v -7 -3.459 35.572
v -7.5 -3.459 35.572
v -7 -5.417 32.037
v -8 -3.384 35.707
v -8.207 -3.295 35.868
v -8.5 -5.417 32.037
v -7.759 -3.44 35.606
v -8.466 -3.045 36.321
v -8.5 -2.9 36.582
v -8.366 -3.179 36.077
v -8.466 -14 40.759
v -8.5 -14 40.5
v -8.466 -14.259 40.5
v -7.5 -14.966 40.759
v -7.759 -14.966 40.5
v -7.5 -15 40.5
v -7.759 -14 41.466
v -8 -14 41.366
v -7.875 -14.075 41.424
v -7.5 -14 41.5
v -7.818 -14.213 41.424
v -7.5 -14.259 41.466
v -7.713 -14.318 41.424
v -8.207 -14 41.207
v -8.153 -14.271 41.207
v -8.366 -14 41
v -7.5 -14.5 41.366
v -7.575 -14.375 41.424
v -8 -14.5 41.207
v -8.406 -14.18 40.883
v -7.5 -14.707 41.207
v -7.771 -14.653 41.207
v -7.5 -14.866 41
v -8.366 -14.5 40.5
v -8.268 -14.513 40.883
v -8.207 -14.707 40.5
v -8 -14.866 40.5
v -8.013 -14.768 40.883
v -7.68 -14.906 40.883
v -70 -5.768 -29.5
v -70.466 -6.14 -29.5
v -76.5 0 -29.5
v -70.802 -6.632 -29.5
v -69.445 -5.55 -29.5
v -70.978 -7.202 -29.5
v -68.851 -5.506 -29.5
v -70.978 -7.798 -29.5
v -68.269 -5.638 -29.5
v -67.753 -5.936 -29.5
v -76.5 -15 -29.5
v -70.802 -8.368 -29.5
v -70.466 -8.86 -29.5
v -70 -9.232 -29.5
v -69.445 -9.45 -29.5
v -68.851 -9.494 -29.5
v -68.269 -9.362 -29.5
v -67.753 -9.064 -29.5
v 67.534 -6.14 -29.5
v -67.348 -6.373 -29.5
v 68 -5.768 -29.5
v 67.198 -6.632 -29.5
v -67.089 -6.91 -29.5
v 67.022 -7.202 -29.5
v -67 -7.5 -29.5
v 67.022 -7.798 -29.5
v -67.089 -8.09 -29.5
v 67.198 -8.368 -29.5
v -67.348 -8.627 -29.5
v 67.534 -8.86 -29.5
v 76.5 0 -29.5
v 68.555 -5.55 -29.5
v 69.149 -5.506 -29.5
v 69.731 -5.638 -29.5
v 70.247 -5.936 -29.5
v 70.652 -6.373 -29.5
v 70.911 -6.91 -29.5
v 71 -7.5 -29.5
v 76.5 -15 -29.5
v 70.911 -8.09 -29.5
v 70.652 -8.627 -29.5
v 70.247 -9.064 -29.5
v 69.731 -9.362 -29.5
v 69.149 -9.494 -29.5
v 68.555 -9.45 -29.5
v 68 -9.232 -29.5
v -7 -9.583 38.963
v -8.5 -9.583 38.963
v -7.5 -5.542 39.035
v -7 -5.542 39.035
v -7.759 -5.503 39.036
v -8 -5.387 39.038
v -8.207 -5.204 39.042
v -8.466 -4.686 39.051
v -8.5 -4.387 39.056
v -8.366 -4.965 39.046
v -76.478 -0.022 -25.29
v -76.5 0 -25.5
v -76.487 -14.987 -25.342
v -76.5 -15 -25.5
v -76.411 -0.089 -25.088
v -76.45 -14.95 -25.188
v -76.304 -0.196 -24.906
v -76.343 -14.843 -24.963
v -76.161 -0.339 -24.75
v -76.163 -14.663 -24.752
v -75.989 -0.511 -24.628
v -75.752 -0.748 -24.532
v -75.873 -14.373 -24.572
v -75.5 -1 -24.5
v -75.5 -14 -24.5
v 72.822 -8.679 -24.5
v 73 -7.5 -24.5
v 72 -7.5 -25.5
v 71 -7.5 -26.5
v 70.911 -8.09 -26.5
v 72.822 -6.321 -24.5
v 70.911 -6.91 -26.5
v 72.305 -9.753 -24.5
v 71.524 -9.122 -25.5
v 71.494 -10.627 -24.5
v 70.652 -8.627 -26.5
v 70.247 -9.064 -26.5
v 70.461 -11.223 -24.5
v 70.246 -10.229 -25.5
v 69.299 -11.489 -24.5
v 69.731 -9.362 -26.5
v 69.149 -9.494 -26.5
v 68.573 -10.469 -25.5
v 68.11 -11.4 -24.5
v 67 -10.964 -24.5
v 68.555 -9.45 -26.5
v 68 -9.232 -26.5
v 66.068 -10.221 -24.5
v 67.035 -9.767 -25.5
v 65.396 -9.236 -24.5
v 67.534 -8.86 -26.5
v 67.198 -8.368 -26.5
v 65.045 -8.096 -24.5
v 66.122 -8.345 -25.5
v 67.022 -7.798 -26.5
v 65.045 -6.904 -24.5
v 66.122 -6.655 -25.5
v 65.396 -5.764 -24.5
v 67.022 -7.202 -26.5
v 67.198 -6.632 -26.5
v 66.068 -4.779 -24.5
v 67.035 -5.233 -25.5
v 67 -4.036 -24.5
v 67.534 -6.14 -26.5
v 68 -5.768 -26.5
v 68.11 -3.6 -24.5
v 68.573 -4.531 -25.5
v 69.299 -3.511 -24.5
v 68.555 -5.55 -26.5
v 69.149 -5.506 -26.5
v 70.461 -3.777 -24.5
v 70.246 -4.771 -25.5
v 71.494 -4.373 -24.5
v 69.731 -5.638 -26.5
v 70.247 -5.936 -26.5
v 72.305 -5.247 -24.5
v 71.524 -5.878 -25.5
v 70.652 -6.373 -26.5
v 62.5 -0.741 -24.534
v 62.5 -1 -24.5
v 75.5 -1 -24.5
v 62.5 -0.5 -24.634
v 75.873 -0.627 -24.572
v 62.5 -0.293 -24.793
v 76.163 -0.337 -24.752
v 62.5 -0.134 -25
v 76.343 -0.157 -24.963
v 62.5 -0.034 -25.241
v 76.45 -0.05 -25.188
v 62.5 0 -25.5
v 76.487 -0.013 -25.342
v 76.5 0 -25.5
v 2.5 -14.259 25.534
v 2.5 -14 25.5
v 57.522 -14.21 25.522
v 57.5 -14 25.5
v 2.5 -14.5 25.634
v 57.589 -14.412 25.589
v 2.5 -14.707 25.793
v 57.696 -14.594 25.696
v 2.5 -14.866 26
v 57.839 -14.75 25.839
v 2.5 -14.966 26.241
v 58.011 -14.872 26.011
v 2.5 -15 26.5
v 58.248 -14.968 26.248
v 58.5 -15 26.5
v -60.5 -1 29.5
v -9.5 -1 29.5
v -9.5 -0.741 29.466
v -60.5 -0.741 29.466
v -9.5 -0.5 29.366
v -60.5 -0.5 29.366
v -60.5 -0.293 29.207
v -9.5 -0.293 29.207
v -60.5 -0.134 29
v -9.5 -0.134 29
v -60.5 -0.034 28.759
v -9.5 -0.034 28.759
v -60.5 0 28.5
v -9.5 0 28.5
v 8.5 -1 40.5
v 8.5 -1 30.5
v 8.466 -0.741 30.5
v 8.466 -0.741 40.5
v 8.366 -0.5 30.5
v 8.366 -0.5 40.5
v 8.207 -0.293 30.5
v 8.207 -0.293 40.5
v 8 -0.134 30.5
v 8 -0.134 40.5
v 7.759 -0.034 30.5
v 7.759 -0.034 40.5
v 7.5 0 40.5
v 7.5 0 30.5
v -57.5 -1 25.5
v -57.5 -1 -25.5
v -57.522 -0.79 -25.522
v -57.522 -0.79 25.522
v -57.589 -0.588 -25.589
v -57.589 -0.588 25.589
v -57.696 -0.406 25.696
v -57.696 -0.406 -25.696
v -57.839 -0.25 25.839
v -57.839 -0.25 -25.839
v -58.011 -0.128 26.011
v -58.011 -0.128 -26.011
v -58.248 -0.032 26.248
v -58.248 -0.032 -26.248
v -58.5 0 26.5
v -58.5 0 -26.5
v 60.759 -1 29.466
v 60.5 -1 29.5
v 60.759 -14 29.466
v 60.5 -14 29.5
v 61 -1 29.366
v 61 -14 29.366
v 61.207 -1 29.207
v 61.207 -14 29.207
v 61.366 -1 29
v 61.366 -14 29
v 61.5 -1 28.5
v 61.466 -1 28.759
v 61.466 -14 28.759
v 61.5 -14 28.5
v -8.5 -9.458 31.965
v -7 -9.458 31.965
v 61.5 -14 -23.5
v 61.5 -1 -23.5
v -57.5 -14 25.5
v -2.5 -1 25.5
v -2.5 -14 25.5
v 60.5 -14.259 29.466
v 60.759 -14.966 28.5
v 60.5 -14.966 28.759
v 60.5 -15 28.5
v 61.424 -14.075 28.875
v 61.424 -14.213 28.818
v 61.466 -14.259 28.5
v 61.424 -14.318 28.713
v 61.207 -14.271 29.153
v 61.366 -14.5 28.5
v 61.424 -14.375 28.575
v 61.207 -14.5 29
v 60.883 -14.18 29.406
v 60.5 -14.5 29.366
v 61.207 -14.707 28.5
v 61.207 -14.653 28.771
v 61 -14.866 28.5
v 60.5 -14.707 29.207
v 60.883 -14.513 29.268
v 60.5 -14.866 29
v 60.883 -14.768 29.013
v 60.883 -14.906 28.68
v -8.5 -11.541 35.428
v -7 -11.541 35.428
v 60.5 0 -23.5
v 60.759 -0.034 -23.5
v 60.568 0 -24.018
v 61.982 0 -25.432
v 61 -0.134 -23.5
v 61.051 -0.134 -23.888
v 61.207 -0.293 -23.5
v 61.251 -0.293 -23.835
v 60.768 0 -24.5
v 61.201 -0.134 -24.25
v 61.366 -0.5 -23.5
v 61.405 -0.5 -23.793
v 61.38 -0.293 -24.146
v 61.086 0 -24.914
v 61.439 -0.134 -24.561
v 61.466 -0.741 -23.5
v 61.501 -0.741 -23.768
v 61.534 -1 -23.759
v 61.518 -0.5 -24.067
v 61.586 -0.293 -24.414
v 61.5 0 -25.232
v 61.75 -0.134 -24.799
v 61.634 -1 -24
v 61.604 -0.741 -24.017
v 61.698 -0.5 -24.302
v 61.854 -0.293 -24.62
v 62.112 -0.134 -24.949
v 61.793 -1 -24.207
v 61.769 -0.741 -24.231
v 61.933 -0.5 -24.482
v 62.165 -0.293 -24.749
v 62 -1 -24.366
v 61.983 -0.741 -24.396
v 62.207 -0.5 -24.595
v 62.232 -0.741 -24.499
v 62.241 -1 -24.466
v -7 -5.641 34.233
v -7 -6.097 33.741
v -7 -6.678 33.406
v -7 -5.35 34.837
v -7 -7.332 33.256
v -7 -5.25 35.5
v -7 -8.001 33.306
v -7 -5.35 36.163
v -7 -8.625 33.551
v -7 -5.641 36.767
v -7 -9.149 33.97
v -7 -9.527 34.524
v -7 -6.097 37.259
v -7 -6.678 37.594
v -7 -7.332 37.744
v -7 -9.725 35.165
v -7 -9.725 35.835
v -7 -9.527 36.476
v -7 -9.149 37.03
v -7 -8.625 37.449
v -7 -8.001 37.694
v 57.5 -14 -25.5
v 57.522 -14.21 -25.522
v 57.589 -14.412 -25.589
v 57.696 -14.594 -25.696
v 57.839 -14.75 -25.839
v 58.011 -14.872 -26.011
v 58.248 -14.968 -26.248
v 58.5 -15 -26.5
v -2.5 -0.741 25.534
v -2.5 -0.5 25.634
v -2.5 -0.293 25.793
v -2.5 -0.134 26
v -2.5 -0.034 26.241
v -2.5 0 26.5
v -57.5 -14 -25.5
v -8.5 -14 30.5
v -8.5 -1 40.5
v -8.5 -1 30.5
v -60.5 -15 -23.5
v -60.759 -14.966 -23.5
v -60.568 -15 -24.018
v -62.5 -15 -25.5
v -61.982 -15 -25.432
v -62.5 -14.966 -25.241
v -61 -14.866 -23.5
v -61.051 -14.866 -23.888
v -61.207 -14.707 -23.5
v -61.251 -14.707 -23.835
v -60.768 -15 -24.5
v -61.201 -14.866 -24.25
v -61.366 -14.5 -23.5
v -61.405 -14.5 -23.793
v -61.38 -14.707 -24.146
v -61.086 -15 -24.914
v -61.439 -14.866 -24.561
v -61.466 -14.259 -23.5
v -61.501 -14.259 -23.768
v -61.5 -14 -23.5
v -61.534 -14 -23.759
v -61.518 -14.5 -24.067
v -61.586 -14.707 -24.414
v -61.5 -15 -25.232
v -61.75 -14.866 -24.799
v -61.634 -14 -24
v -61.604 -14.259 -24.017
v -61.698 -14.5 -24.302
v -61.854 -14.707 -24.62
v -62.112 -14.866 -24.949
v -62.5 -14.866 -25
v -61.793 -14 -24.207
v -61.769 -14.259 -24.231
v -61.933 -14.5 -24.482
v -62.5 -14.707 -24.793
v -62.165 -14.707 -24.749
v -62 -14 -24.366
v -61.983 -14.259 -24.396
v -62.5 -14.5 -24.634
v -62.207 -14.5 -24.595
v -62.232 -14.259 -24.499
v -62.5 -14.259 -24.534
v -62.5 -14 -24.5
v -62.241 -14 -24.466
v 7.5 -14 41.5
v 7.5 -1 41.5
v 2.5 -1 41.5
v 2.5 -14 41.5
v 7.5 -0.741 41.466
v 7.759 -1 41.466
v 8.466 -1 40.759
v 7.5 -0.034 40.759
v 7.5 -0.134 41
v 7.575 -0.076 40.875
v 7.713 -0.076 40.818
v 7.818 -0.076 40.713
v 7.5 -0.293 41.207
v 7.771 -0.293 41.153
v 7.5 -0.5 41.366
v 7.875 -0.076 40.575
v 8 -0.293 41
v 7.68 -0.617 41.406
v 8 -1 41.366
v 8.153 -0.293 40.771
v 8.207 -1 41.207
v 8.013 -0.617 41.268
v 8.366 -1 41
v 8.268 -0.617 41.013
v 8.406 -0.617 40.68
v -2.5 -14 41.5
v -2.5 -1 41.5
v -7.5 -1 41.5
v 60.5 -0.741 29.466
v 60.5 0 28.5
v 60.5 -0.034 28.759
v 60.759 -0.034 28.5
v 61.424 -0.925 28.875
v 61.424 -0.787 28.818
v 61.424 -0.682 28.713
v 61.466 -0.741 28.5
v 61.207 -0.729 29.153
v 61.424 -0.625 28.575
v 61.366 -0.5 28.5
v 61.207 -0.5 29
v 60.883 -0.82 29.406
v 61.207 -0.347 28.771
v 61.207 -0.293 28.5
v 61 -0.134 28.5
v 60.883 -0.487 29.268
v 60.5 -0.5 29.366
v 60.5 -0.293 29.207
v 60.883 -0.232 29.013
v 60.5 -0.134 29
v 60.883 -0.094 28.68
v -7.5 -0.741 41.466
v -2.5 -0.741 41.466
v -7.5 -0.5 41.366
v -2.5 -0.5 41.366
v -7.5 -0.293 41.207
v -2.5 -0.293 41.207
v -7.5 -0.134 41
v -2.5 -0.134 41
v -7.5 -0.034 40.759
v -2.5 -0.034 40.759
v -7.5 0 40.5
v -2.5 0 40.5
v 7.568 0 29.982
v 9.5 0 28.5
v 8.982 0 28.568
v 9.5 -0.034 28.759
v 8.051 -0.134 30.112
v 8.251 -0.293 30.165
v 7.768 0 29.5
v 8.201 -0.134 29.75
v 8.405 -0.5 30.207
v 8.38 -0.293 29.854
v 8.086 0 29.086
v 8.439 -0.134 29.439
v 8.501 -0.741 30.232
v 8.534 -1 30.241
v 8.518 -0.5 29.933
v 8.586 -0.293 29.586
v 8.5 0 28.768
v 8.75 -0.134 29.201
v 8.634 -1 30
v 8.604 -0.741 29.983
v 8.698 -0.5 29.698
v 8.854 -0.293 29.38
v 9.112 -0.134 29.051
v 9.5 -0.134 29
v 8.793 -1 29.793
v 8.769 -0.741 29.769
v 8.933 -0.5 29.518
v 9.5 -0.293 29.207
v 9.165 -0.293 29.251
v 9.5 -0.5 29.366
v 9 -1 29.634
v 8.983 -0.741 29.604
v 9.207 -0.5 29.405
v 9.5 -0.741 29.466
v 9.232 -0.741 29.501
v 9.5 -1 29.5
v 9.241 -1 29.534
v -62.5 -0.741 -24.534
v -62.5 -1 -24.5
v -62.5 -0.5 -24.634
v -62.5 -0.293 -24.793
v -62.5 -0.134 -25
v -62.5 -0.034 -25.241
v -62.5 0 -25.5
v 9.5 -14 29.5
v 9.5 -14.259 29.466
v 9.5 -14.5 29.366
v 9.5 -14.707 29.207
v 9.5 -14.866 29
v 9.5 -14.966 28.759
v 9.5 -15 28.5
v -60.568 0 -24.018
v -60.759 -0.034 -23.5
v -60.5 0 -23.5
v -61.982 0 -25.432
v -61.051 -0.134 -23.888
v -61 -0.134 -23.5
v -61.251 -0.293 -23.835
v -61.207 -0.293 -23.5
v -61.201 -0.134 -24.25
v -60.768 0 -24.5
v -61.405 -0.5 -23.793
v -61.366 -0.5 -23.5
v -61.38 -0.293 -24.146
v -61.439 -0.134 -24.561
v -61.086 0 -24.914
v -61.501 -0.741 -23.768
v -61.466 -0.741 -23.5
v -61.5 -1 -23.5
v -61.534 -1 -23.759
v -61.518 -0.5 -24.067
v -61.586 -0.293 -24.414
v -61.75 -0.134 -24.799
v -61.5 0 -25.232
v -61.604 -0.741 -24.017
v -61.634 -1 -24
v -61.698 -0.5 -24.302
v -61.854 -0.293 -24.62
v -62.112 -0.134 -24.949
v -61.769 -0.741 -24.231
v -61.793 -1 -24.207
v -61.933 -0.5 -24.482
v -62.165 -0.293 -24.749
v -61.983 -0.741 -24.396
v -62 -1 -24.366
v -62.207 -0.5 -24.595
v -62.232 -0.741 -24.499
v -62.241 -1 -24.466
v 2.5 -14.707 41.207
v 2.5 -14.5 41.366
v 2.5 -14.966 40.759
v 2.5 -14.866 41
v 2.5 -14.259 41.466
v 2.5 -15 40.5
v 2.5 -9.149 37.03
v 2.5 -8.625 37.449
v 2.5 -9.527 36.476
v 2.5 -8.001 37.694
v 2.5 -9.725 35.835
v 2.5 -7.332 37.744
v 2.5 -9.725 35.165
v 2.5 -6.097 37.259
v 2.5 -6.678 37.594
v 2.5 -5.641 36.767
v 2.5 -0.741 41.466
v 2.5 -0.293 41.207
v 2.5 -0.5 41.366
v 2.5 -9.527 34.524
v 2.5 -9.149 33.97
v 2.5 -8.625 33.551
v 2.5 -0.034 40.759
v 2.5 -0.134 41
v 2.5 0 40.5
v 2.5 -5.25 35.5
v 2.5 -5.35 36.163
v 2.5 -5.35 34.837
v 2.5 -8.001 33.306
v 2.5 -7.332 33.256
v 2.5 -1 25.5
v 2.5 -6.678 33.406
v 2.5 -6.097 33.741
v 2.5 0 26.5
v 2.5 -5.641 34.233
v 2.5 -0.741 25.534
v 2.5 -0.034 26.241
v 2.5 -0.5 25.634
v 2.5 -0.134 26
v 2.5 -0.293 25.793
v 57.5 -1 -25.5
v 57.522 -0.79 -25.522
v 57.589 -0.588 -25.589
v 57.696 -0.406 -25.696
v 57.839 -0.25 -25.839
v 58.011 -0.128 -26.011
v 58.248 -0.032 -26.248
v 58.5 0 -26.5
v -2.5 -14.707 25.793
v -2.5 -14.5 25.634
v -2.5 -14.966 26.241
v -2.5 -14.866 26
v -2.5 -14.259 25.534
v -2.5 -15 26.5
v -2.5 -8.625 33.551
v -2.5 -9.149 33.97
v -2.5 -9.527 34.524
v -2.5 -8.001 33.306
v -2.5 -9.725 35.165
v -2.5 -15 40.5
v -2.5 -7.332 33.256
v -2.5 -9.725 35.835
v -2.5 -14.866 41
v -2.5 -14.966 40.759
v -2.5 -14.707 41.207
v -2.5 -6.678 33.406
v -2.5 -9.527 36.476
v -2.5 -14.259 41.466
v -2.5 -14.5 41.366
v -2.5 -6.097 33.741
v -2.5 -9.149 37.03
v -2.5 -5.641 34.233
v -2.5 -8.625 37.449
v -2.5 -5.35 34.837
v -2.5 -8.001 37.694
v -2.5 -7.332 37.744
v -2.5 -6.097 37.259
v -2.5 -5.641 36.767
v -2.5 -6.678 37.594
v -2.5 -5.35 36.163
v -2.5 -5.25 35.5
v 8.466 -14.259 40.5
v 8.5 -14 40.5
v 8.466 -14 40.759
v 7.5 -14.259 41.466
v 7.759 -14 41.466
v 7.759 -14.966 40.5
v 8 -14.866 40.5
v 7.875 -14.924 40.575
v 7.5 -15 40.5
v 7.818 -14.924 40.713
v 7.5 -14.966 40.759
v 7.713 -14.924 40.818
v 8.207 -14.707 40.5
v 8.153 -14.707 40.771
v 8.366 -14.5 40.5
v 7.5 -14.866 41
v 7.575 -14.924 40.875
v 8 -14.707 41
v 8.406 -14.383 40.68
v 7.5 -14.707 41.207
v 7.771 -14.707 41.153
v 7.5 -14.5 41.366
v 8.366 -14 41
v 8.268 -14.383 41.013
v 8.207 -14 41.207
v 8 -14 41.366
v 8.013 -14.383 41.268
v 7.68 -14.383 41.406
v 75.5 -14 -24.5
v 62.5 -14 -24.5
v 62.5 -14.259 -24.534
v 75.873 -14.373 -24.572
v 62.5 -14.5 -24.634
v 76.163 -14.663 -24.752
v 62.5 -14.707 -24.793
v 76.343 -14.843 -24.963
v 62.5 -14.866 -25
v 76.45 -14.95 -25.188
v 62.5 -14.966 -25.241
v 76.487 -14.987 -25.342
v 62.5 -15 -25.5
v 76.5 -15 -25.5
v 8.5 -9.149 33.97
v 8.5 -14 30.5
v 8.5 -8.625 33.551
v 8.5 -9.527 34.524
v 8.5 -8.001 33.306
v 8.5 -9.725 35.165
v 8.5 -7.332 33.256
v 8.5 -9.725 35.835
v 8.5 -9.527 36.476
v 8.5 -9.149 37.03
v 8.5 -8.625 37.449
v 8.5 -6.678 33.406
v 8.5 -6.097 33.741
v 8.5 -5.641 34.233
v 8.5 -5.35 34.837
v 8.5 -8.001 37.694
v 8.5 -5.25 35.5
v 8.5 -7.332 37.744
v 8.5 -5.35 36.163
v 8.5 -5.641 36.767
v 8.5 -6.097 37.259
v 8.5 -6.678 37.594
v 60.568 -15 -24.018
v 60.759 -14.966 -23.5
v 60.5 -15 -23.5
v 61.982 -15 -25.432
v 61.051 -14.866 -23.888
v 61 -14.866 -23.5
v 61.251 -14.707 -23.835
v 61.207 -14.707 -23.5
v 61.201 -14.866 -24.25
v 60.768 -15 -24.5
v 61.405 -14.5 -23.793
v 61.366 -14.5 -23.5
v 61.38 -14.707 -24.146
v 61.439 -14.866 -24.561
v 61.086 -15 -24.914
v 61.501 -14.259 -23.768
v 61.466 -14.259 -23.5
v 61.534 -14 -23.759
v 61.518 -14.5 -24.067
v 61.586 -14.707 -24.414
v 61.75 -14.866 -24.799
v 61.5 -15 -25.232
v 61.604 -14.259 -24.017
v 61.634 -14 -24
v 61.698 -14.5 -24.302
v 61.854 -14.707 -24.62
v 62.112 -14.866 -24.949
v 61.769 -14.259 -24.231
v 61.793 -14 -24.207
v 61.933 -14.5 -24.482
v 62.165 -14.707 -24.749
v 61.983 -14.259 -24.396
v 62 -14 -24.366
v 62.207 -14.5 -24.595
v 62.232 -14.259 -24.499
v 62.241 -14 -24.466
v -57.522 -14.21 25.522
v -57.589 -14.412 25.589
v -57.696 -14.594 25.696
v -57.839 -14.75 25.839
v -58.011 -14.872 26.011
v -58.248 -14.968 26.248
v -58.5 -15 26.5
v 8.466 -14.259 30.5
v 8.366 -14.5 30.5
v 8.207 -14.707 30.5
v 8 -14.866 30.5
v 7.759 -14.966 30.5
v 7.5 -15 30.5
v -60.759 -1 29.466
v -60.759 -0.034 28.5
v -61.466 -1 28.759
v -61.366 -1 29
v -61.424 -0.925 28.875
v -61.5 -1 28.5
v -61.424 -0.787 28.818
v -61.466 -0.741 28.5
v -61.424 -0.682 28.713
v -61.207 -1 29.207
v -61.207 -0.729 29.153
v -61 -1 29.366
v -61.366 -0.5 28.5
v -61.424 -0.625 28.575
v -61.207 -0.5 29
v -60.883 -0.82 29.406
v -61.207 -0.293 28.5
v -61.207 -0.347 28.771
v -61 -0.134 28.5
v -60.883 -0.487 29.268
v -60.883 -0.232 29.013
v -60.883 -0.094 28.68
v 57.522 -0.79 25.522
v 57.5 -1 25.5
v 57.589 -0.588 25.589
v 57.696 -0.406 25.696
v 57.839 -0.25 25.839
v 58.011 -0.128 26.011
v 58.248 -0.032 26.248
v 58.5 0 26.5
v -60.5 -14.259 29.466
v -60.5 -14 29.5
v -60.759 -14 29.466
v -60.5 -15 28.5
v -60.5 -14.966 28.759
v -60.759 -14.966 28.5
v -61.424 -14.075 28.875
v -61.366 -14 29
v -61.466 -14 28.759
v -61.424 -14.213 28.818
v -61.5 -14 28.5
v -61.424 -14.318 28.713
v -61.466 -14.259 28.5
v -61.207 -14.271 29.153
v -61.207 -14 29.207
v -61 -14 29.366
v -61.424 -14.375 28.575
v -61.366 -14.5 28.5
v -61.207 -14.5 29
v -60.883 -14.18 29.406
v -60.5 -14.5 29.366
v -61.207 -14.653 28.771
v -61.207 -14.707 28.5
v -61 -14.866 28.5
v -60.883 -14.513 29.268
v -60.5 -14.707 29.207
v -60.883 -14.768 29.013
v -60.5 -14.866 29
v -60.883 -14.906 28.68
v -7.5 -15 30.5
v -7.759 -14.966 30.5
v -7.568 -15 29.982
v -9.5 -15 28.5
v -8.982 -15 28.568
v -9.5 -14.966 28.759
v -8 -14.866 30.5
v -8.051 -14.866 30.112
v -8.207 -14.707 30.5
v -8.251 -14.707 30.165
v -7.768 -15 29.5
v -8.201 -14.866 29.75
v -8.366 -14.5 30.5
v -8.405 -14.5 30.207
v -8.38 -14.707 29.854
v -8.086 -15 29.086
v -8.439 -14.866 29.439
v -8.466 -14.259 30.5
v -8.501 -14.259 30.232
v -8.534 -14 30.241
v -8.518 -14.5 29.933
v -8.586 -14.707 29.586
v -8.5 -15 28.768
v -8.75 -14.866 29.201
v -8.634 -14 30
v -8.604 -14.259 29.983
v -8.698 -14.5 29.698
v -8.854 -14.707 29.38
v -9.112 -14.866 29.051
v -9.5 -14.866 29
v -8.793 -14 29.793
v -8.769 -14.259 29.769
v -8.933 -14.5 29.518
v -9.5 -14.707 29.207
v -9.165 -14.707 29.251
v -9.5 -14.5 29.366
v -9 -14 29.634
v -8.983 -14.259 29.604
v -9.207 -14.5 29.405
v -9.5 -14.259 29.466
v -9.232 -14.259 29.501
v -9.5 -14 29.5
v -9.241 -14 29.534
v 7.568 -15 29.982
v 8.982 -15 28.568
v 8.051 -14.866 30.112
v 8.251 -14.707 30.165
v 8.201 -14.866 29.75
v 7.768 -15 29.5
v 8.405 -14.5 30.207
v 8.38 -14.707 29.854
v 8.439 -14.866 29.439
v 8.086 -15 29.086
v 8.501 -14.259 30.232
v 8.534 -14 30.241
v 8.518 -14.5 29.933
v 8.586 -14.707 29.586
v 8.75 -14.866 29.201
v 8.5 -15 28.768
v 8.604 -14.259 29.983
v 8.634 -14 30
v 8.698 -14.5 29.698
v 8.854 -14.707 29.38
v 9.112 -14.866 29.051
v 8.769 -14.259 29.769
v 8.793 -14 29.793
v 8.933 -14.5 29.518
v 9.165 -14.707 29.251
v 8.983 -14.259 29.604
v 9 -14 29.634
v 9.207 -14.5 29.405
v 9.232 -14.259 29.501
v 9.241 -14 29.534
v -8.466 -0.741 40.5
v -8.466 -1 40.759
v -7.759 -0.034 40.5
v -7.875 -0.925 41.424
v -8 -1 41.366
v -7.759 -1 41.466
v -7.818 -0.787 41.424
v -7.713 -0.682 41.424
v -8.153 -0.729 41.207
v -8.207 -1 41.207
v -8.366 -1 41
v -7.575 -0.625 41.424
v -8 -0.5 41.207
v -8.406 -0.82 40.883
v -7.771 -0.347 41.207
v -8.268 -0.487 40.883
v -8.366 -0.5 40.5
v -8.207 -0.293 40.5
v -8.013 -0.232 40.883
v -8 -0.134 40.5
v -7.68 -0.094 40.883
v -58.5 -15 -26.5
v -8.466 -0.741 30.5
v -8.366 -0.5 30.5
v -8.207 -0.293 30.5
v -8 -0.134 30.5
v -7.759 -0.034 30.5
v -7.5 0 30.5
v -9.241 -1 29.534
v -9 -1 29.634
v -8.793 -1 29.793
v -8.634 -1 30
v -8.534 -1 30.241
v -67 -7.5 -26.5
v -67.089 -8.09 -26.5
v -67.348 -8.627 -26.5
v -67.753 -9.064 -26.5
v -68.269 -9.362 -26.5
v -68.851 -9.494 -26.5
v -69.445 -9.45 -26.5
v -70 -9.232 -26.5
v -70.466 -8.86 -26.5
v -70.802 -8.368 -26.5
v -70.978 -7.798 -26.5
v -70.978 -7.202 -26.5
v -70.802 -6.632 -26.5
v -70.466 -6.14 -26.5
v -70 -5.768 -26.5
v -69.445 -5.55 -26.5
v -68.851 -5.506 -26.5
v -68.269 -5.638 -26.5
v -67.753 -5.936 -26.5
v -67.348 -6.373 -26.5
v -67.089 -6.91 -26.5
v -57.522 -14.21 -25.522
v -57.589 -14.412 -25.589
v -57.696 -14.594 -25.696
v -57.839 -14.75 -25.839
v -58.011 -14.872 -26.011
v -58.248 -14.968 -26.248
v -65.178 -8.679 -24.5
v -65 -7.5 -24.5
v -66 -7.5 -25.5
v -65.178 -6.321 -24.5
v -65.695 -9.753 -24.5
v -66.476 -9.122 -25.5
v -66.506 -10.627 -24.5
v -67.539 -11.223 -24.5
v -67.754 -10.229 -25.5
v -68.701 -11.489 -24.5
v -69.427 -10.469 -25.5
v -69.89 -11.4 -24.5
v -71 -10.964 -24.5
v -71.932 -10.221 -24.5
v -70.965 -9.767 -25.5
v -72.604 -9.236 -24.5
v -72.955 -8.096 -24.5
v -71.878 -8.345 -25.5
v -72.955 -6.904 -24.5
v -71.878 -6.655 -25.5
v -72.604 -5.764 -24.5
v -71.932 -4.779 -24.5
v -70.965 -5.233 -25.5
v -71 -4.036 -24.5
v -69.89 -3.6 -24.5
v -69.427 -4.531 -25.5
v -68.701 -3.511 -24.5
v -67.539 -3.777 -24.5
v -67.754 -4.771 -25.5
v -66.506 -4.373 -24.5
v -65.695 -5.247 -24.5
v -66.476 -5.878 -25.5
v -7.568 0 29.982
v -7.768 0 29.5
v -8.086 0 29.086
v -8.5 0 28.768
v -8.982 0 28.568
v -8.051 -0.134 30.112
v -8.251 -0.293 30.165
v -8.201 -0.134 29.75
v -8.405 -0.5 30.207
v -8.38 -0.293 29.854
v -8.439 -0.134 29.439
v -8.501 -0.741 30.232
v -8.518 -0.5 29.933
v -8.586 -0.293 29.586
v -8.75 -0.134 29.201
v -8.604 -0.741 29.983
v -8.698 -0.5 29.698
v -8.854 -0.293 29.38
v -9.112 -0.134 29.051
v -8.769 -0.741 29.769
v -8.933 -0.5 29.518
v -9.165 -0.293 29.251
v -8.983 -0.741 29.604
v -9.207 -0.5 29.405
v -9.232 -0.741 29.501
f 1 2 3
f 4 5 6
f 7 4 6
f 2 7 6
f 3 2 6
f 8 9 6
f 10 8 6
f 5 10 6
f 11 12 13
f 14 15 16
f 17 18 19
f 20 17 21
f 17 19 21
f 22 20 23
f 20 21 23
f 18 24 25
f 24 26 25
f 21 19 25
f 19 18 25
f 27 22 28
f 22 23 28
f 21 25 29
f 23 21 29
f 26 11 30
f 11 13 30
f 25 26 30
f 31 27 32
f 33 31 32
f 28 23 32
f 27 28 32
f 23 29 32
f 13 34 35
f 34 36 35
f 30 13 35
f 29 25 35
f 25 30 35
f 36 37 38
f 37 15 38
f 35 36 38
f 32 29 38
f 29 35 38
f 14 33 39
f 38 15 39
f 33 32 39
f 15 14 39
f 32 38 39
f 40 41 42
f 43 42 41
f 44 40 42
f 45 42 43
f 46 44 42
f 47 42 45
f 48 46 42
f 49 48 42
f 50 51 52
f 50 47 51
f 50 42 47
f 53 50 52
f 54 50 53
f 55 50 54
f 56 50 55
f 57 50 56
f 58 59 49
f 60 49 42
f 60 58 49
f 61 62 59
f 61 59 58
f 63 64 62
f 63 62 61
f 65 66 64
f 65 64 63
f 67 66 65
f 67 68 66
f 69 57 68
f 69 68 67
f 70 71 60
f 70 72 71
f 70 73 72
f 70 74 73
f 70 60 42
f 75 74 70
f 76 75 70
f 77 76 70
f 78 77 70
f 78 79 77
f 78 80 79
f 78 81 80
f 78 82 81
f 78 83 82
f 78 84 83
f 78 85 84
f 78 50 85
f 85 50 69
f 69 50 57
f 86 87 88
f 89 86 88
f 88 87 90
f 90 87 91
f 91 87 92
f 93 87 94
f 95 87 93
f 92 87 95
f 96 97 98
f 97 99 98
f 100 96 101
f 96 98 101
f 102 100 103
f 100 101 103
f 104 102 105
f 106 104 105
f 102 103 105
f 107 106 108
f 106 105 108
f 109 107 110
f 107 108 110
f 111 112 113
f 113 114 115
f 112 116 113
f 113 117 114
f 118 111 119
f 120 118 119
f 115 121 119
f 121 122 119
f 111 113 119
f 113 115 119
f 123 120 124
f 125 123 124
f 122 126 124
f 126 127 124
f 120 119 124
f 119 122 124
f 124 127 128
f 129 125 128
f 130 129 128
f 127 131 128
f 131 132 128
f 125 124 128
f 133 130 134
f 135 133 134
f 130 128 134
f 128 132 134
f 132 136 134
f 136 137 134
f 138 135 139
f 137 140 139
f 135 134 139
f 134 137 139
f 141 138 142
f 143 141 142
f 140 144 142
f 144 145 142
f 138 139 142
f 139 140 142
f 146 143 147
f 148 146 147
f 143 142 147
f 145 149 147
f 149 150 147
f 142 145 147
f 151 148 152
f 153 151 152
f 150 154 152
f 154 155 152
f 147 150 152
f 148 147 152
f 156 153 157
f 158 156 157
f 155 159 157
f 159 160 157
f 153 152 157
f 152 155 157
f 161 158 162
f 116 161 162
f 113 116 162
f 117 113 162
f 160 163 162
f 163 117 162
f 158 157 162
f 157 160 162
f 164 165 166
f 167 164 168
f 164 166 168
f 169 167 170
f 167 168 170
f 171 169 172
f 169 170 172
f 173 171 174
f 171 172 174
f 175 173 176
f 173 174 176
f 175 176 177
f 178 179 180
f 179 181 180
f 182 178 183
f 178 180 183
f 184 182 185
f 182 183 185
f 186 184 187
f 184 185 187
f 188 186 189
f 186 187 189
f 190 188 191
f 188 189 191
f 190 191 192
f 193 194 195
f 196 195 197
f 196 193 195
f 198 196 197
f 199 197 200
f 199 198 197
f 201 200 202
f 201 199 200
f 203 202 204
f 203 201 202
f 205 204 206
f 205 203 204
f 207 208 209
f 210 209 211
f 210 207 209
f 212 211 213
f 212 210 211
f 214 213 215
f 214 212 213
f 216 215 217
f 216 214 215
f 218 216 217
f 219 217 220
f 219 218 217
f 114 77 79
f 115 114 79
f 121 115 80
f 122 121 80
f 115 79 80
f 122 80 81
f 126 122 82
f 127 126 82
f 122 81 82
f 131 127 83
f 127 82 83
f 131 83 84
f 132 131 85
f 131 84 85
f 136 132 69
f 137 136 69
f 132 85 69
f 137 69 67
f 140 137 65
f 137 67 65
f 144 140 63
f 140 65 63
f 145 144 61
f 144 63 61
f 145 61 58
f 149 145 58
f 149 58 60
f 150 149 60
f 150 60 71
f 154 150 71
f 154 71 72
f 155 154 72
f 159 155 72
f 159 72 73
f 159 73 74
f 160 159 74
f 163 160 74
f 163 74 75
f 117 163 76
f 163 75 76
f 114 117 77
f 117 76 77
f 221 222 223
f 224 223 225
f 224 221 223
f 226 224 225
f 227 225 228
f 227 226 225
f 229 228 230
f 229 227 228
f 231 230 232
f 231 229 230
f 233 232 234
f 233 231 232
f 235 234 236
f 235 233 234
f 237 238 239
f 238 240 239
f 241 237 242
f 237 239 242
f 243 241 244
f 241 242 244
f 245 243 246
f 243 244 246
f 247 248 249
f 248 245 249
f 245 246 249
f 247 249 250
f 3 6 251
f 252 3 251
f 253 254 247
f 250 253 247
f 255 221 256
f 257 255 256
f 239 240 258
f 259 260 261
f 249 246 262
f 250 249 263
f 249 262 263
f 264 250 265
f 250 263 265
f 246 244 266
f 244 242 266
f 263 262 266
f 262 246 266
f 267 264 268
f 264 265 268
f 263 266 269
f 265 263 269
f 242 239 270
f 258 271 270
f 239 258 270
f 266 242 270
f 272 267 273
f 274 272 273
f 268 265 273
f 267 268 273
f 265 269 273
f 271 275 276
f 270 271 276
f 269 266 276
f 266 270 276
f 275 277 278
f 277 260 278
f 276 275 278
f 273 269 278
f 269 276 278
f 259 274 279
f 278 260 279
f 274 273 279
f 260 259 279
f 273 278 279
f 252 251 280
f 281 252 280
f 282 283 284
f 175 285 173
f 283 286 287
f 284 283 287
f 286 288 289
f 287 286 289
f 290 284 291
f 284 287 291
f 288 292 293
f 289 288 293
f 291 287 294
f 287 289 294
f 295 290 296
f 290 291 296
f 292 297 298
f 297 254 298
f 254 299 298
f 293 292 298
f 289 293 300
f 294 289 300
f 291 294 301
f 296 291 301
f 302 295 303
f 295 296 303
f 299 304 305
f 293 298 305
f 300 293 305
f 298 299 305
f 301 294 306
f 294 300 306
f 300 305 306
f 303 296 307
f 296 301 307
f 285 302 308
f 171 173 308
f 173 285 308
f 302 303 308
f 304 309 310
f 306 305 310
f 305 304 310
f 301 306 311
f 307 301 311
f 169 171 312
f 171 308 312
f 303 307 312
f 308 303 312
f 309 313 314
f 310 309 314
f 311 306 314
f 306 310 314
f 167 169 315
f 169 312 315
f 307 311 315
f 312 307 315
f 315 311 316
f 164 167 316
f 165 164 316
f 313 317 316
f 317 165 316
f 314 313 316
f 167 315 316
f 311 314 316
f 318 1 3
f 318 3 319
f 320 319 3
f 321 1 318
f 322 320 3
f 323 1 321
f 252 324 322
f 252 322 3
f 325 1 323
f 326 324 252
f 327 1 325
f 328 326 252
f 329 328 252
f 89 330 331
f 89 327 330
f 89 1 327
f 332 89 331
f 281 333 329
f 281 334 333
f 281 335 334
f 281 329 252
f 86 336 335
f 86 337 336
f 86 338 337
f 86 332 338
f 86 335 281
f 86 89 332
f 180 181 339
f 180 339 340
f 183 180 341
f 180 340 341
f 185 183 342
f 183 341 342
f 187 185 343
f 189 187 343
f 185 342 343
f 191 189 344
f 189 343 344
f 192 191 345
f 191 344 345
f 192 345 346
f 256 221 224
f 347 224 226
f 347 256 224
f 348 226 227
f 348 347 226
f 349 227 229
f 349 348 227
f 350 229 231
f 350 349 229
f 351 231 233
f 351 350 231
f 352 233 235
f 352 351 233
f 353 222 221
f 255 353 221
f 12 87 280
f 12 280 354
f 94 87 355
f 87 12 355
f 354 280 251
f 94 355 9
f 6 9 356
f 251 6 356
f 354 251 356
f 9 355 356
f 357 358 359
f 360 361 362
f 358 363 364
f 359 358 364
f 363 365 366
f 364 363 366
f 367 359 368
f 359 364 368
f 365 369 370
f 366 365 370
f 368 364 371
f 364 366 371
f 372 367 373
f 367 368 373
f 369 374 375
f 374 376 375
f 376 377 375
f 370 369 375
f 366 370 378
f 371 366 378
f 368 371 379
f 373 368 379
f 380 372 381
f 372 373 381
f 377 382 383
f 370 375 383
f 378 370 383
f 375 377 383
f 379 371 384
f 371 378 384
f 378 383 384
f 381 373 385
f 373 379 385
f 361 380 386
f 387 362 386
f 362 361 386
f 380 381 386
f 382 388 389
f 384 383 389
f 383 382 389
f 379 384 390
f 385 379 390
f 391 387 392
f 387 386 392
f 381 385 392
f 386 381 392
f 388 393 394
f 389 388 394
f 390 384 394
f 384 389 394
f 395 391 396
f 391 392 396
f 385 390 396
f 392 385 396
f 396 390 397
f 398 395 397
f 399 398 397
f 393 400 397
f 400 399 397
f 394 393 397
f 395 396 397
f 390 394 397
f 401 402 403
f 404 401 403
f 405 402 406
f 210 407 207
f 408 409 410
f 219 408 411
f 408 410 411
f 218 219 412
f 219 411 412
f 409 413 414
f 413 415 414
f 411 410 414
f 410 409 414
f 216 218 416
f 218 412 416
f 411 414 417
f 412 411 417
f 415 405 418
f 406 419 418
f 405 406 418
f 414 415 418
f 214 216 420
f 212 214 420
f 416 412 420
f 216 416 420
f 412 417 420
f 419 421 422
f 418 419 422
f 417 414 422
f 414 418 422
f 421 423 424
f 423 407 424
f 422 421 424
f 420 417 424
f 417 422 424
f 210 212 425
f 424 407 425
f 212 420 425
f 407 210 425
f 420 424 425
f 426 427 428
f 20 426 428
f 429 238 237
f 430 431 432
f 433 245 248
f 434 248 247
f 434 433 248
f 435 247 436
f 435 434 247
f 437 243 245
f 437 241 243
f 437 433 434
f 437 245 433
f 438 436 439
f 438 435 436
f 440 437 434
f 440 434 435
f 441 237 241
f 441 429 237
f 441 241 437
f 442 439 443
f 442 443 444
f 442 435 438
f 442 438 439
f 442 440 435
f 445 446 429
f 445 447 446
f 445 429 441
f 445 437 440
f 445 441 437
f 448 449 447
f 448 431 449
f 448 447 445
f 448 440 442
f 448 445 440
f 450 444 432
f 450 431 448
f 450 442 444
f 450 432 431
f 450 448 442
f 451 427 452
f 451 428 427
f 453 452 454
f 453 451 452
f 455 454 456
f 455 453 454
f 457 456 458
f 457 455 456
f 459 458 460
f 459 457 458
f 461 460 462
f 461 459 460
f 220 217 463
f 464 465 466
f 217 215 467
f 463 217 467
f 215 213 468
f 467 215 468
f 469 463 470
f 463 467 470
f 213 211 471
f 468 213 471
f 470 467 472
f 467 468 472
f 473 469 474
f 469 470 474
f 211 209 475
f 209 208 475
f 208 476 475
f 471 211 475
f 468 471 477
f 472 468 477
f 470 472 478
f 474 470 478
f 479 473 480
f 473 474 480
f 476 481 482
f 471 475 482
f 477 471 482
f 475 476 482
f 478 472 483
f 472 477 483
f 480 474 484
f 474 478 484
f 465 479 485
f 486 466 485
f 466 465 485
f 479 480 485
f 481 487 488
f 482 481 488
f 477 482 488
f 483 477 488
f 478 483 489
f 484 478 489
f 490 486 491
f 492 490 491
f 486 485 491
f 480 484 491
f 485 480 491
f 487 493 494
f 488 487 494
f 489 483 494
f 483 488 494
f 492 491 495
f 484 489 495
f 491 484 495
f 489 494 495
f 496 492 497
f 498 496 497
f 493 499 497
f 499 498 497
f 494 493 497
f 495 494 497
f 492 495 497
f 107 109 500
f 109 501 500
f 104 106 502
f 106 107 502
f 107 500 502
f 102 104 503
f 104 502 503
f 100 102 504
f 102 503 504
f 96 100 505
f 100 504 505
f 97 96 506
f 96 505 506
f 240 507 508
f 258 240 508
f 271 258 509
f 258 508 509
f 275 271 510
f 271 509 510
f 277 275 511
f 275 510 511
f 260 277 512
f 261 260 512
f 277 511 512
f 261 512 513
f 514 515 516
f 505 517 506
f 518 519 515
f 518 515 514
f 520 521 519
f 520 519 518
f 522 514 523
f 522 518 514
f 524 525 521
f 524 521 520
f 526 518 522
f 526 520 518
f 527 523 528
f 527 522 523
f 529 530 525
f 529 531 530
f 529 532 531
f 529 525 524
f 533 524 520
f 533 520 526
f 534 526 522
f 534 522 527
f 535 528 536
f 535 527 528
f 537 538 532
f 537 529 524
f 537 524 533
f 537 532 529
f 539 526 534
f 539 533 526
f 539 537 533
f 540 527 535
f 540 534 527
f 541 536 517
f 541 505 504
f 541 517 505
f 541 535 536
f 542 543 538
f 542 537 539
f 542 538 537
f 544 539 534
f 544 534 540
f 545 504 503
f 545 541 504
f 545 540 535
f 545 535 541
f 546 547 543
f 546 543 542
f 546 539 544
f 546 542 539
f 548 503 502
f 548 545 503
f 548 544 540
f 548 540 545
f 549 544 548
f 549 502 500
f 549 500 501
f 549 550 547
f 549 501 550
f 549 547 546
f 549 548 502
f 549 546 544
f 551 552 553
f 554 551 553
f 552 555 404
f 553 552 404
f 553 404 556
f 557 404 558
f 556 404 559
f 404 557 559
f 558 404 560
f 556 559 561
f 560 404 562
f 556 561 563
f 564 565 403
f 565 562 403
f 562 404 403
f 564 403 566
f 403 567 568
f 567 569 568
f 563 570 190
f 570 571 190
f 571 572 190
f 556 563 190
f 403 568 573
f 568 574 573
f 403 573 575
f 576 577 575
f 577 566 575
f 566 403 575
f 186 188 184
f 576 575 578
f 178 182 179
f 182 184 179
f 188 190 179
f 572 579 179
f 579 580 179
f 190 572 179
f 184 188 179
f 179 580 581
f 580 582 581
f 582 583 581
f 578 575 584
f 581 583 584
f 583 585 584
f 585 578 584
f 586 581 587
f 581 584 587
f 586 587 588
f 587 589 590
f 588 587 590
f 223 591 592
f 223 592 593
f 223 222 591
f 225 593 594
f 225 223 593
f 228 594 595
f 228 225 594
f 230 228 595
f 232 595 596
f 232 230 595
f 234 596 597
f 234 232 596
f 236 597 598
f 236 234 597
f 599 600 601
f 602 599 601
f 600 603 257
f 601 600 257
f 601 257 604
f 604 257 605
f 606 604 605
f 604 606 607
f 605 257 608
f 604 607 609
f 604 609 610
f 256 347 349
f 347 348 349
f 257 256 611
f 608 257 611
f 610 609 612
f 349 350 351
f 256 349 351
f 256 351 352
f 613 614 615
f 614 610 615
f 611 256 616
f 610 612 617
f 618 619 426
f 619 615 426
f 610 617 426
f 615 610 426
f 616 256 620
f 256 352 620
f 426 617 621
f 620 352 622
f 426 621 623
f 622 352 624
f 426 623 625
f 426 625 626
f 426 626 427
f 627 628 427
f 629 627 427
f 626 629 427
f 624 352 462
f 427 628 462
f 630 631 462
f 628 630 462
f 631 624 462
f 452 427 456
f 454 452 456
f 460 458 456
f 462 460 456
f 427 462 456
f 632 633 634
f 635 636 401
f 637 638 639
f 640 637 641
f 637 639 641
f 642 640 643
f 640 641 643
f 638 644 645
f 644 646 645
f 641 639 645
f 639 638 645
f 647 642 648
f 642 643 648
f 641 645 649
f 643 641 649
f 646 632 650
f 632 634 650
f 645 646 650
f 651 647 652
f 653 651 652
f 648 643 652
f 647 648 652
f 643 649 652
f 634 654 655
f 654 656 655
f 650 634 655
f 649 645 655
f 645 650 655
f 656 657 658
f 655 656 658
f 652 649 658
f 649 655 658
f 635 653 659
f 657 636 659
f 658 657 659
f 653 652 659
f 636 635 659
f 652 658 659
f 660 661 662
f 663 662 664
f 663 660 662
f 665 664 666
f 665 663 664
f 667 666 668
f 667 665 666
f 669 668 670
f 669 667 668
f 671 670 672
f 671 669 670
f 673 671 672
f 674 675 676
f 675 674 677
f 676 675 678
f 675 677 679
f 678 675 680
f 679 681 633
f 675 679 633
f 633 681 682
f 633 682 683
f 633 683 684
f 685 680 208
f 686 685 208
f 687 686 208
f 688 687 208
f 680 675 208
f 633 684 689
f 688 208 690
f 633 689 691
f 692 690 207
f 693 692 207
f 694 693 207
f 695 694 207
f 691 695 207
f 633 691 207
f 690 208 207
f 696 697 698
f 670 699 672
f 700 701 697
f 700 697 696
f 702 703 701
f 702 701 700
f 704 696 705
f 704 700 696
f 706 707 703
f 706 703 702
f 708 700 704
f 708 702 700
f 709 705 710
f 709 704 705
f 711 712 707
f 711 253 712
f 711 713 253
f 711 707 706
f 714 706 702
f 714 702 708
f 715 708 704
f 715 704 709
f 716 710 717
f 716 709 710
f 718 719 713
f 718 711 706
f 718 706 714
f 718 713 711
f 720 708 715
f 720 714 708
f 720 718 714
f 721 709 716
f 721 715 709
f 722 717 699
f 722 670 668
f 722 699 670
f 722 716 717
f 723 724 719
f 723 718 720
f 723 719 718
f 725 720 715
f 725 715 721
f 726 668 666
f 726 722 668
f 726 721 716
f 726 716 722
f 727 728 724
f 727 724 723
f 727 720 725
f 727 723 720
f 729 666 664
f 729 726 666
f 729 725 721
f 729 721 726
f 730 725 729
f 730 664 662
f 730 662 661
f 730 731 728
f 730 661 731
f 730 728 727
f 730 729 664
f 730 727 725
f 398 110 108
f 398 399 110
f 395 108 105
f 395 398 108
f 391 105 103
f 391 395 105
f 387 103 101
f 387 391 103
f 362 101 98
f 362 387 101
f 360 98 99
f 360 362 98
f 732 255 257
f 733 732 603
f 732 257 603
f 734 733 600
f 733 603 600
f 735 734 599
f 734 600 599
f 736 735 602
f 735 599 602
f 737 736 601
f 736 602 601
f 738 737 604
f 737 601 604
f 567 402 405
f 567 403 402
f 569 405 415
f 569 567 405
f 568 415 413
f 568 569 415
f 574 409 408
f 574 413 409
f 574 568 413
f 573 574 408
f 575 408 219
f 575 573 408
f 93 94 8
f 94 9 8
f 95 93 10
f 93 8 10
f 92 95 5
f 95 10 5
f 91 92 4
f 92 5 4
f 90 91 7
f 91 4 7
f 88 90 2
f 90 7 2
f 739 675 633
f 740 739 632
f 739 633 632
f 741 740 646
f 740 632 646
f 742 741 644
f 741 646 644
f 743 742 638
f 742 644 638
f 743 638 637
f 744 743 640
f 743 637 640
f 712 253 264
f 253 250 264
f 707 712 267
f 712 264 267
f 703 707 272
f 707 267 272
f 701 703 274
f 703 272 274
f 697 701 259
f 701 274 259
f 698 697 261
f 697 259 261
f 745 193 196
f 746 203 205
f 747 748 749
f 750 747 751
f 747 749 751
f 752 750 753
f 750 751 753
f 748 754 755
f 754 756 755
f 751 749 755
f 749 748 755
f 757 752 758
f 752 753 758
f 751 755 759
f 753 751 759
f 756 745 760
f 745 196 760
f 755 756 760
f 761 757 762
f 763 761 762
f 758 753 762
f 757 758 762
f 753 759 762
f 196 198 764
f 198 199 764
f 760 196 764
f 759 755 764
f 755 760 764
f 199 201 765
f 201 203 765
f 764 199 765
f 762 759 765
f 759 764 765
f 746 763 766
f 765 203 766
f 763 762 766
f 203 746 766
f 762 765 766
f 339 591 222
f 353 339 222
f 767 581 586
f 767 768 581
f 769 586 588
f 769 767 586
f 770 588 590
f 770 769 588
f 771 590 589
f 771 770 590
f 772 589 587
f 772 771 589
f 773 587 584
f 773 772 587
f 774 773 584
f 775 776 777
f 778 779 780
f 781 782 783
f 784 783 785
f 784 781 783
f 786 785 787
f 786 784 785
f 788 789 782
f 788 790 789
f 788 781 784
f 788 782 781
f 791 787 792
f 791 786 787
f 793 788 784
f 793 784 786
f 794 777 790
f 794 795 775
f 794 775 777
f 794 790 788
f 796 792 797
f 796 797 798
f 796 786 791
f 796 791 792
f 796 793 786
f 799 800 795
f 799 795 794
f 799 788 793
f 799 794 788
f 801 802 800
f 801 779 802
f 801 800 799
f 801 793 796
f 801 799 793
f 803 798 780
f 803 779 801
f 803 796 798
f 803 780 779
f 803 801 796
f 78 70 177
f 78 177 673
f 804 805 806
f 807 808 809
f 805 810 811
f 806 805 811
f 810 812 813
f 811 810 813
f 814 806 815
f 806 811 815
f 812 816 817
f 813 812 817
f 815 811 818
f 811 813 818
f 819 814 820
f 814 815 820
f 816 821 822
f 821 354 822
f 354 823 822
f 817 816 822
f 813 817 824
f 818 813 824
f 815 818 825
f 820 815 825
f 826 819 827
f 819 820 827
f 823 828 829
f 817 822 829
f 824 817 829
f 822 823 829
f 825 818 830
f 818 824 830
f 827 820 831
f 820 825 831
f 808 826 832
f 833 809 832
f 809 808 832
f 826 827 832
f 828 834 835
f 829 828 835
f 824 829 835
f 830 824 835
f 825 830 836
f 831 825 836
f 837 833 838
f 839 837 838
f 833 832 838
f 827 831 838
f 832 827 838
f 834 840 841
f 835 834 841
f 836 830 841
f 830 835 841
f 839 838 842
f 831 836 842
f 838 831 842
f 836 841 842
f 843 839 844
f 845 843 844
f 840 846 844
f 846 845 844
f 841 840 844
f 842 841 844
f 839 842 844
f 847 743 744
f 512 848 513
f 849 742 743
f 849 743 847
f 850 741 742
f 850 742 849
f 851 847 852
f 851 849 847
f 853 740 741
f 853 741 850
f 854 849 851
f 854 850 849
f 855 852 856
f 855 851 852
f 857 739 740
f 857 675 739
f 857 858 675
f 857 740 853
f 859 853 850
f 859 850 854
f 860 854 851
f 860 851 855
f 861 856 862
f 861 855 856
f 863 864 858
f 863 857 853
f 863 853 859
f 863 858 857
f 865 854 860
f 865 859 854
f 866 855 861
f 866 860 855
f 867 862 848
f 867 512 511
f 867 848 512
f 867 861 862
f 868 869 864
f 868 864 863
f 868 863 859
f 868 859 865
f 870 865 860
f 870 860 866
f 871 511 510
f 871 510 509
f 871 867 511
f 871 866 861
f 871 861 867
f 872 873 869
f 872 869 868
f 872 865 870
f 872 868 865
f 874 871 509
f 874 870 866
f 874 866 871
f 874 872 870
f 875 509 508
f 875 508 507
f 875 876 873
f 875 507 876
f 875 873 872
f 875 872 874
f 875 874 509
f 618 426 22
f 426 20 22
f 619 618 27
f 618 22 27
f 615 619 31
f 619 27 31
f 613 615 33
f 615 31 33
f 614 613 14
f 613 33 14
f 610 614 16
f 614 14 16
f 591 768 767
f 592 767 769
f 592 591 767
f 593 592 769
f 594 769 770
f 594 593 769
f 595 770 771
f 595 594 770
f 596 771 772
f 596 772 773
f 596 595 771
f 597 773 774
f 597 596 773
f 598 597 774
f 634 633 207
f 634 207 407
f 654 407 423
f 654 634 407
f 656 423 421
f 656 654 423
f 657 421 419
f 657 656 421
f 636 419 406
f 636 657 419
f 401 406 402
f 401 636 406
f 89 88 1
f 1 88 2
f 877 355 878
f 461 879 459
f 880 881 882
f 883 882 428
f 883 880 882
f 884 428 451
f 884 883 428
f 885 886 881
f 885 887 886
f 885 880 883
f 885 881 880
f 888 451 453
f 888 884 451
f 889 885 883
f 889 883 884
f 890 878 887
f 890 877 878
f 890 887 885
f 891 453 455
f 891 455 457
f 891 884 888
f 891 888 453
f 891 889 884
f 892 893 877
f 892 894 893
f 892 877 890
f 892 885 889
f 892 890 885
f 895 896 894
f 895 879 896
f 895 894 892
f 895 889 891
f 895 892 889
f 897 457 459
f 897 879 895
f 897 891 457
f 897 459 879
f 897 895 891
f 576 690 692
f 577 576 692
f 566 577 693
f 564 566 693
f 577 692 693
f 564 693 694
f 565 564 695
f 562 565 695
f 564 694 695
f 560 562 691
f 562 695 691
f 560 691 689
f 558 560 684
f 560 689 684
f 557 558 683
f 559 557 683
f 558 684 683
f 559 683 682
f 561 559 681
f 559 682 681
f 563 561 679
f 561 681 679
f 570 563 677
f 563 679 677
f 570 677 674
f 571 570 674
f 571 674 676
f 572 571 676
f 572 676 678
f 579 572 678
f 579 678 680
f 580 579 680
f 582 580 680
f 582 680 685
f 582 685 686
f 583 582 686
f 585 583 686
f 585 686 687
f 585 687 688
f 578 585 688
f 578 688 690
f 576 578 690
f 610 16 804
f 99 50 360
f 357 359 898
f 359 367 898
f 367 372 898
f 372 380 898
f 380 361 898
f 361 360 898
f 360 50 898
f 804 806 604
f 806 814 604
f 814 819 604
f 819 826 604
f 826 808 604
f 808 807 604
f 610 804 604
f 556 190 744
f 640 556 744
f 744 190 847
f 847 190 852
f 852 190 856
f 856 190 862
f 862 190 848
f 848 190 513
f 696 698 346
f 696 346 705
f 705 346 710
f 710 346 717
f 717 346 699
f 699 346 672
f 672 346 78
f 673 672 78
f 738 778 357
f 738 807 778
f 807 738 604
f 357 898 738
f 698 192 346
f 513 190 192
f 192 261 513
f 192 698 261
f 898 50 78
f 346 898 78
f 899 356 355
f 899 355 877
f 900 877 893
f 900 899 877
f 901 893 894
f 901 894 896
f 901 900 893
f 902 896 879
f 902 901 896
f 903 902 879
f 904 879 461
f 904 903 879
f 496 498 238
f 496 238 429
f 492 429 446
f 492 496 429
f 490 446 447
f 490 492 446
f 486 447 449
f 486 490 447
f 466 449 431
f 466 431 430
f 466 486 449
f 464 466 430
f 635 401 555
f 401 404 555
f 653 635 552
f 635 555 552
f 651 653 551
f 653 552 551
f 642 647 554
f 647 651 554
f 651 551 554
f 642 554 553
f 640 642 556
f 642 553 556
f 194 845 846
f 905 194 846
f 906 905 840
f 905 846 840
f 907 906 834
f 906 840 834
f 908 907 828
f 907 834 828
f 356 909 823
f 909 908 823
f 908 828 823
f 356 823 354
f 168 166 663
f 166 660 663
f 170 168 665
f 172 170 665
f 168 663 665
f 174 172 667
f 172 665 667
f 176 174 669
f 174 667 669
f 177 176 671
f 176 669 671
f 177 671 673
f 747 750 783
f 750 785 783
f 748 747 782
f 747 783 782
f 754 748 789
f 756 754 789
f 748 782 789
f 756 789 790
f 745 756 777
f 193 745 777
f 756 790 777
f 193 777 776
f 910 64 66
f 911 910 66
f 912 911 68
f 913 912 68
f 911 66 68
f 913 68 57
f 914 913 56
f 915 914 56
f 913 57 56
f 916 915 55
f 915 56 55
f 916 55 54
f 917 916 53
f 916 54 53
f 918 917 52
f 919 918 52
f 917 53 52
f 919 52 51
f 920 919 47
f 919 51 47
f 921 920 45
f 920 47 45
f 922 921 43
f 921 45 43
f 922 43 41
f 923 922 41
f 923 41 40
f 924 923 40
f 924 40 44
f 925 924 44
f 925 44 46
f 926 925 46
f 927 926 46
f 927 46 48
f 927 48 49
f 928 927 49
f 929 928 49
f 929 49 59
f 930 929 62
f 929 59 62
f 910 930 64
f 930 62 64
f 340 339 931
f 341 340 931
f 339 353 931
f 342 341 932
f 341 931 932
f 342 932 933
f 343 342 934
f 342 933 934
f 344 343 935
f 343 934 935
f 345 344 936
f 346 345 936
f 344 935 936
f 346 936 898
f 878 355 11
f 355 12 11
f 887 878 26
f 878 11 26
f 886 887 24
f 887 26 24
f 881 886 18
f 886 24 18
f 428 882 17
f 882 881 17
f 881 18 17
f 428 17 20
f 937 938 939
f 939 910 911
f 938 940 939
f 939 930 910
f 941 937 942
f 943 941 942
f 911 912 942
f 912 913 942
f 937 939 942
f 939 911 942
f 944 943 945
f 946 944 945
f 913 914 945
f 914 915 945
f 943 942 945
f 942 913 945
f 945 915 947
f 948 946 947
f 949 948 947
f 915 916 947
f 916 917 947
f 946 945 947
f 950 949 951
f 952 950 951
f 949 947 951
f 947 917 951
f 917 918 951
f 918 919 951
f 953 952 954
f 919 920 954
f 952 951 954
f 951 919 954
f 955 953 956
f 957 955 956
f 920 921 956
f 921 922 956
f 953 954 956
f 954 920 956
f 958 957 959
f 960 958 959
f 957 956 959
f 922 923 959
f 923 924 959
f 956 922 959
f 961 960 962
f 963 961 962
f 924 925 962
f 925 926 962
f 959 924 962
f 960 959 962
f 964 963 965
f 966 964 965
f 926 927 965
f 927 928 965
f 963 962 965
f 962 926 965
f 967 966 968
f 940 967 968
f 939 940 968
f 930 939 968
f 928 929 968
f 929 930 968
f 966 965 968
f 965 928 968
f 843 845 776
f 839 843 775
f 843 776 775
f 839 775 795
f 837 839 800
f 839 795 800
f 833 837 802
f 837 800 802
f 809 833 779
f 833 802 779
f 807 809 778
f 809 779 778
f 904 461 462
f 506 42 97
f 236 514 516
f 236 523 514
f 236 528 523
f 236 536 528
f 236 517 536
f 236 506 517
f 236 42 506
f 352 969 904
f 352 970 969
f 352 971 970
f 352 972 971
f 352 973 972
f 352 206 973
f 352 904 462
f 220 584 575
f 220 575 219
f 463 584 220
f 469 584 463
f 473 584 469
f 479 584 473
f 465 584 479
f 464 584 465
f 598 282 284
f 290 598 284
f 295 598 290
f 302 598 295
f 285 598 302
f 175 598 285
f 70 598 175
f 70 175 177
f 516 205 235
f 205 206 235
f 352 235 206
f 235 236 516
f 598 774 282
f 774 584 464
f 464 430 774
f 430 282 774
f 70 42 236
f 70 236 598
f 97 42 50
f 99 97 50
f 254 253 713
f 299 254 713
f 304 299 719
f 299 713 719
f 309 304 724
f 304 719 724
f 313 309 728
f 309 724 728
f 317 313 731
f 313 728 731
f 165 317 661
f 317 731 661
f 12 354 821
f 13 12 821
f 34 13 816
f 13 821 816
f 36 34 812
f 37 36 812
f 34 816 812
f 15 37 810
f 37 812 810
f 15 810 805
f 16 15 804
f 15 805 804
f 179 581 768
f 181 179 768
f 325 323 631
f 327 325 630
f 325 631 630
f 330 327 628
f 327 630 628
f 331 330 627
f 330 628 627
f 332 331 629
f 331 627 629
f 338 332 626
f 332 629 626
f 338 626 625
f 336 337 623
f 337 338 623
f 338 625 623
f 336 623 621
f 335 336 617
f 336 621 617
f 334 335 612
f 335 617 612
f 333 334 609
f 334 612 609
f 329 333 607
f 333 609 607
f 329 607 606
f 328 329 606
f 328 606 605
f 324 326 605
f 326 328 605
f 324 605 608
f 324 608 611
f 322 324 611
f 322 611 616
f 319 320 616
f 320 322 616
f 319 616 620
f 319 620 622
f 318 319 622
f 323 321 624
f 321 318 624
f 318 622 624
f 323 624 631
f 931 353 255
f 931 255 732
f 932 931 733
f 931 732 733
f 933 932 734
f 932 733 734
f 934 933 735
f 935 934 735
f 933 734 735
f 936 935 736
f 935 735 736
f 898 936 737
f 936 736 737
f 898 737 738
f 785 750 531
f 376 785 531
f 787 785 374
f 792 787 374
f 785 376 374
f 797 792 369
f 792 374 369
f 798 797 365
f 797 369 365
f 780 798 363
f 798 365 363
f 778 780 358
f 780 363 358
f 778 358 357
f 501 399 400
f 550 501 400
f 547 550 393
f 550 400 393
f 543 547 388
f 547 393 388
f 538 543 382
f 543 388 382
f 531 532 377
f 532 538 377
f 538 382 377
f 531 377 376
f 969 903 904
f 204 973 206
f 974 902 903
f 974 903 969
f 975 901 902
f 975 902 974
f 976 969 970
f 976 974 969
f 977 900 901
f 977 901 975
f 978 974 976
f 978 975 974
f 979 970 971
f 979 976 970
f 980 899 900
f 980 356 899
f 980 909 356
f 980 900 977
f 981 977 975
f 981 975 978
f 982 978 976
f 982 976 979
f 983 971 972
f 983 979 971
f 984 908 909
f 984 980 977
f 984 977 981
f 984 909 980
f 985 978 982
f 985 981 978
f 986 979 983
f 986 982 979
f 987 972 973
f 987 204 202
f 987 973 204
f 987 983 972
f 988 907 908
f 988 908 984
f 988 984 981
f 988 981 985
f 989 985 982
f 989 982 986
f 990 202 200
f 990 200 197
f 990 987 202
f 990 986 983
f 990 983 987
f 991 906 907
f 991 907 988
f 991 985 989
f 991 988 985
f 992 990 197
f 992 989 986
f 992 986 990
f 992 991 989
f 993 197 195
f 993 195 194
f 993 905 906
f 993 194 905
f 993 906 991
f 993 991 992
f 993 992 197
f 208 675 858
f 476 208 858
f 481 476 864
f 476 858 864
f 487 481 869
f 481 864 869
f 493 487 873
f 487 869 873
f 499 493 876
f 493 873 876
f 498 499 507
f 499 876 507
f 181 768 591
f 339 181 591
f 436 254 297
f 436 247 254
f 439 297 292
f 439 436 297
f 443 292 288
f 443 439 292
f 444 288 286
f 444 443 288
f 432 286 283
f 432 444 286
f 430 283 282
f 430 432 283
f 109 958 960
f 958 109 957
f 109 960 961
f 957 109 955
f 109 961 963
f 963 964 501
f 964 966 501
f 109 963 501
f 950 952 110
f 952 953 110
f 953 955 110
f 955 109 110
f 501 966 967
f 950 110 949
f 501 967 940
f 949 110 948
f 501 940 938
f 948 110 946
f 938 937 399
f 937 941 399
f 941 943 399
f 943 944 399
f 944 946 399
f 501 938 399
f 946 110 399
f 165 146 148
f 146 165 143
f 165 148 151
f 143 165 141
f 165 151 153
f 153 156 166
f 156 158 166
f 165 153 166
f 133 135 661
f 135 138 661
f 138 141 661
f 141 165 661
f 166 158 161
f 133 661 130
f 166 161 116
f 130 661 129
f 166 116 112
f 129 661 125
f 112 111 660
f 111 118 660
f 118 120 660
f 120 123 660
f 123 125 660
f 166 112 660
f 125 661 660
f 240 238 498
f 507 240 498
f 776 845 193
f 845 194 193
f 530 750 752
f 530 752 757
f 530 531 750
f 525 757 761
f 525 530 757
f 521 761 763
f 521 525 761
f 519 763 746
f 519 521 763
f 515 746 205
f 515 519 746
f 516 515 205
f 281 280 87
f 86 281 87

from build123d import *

# Parameters (mm, degrees)
F1_DEPTH = 15
F2_R     = 2.25
F3_DEPTH = 25
F5_R     = 2.25
F6_DEPTH = 1.5
F7_W     = 15
F7_H     = 15
F7_R     = 2
F8_DEPTH = 5
F9_R     = 1
F10_SIZE = 2


with BuildPart() as f1:
    # F0 (on Front) → F1 (new body)
    with BuildSketch(Plane.XZ):
        Polygon((-57.5, -25.5), (-57.5, 25.5), (-8.5, 25.5), (-2.5, 25.5), (-2.5, 41.5), (-8.5, 41.5), (-8.5, 29.5), (-61.5, 29.5), (-61.5, -29.5), (61.5, -29.5), (61.5, 29.5), (8.5, 29.5), (8.5, 41.5), (2.5, 41.5), (2.5, 25.5), (8.5, 25.5), (57.5, 25.5), (57.5, -25.5), align=None)
    extrude(amount=F1_DEPTH)

    # F2 (on face) → F3 (cut)
    with BuildSketch(Plane.YZ.offset(8.5)):
        with Locations((-7.5, 35.5)):
            Circle(F2_R)
    extrude(amount=-F3_DEPTH, mode=Mode.SUBTRACT)

    # F5 (on face) → F6 (cut)
    with BuildSketch(Plane(origin=(-8.5, 0, 0), x_dir=(0, -1, 0), z_dir=(-1, 0, 0))):
        Polygon((9.45799692, 31.9645252943), (11.5408093696, 35.4279377204), (9.5828124496, 38.9634124261), (5.54200308, 39.0354747057), (3.4591906304, 35.5720622796), (5.4171875504, 32.0365875739), align=None)
        with Locations((7.5, 35.5)):
            Circle(F5_R, mode=Mode.SUBTRACT)
    extrude(amount=-F6_DEPTH, mode=Mode.SUBTRACT)

    # F7 (on face) → F8 (join)
    with BuildSketch(Plane(origin=(0, 0, -29.5), x_dir=(1, 0, 0), z_dir=(0, 0, -1))):
        with Locations((-69, 7.5)):
            Rectangle(F7_W, F7_H)
        with Locations((-69, 7.5)):
            Circle(F7_R, mode=Mode.SUBTRACT)
        with Locations((69, 7.5)):
            Rectangle(F7_W, F7_H)
        with Locations((69, 7.5)):
            Circle(F7_R, mode=Mode.SUBTRACT)
    extrude(amount=-F8_DEPTH)

    # F9
    f9_edges = [f1.edges().sort_by_distance(p)[0] for p in [
        (30, 0, 25.5),
        (57.5, 0, 0),
        (-30, 0, 25.5),
        (-57.5, 0, 0),
        (0, 0, -25.5),
        (-30, -15, 25.5),
        (30, -15, 25.5),
        (-57.5, -15, 0),
        (0, -15, -25.5),
        (57.5, -15, 0),
        (-69, -15, -24.5),
        (-76.5, -7.5, -24.5),
        (-69, 0, -24.5),
        (69, 0, -24.5),
        (76.5, -7.5, -24.5),
        (69, -15, -24.5),
        (61.5, -7.5, -24.5),
        (-61.5, -7.5, -24.5),
        (-35, -15, 29.5),
        (-35, 0, 29.5),
        (35, 0, 29.5),
        (8.5, -7.5, 29.5),
        (-8.5, -7.5, 29.5),
        (-8.5, -4.500597, 37.303768),
        (-8.5, -15, 35.5),
        (-8.5, 0, 35.5),
        (-8.5, -7.5, 41.5),
        (8.5, -7.5, 41.5),
        (8.5, -15, 35.5),
        (35, -15, 29.5),
        (61.5, -7.5, 29.5),
        (-61.5, -7.5, 29.5),
        (5.5, 0, 41.5),
        (-5.5, 0, 41.5),
        (-5.5, -15, 41.5),
        (5.5, -15, 41.5),
        (-61.5, -15, 2.5),
        (61.5, -15, 2.5),
        (8.5, 0, 35.5),
        (61.5, 0, 2.5),
        (-61.5, 0, 2.5),
    ]]
    fillet(f9_edges, radius=F9_R)

    # F10
    f10_edges = [f1.edges().sort_by_distance(p)[0] for p in [
        (67, -7.5, -24.5),
        (-71, -7.5, -24.5),
    ]]
    chamfer(f10_edges, length=F10_SIZE)


solid = f1.part
